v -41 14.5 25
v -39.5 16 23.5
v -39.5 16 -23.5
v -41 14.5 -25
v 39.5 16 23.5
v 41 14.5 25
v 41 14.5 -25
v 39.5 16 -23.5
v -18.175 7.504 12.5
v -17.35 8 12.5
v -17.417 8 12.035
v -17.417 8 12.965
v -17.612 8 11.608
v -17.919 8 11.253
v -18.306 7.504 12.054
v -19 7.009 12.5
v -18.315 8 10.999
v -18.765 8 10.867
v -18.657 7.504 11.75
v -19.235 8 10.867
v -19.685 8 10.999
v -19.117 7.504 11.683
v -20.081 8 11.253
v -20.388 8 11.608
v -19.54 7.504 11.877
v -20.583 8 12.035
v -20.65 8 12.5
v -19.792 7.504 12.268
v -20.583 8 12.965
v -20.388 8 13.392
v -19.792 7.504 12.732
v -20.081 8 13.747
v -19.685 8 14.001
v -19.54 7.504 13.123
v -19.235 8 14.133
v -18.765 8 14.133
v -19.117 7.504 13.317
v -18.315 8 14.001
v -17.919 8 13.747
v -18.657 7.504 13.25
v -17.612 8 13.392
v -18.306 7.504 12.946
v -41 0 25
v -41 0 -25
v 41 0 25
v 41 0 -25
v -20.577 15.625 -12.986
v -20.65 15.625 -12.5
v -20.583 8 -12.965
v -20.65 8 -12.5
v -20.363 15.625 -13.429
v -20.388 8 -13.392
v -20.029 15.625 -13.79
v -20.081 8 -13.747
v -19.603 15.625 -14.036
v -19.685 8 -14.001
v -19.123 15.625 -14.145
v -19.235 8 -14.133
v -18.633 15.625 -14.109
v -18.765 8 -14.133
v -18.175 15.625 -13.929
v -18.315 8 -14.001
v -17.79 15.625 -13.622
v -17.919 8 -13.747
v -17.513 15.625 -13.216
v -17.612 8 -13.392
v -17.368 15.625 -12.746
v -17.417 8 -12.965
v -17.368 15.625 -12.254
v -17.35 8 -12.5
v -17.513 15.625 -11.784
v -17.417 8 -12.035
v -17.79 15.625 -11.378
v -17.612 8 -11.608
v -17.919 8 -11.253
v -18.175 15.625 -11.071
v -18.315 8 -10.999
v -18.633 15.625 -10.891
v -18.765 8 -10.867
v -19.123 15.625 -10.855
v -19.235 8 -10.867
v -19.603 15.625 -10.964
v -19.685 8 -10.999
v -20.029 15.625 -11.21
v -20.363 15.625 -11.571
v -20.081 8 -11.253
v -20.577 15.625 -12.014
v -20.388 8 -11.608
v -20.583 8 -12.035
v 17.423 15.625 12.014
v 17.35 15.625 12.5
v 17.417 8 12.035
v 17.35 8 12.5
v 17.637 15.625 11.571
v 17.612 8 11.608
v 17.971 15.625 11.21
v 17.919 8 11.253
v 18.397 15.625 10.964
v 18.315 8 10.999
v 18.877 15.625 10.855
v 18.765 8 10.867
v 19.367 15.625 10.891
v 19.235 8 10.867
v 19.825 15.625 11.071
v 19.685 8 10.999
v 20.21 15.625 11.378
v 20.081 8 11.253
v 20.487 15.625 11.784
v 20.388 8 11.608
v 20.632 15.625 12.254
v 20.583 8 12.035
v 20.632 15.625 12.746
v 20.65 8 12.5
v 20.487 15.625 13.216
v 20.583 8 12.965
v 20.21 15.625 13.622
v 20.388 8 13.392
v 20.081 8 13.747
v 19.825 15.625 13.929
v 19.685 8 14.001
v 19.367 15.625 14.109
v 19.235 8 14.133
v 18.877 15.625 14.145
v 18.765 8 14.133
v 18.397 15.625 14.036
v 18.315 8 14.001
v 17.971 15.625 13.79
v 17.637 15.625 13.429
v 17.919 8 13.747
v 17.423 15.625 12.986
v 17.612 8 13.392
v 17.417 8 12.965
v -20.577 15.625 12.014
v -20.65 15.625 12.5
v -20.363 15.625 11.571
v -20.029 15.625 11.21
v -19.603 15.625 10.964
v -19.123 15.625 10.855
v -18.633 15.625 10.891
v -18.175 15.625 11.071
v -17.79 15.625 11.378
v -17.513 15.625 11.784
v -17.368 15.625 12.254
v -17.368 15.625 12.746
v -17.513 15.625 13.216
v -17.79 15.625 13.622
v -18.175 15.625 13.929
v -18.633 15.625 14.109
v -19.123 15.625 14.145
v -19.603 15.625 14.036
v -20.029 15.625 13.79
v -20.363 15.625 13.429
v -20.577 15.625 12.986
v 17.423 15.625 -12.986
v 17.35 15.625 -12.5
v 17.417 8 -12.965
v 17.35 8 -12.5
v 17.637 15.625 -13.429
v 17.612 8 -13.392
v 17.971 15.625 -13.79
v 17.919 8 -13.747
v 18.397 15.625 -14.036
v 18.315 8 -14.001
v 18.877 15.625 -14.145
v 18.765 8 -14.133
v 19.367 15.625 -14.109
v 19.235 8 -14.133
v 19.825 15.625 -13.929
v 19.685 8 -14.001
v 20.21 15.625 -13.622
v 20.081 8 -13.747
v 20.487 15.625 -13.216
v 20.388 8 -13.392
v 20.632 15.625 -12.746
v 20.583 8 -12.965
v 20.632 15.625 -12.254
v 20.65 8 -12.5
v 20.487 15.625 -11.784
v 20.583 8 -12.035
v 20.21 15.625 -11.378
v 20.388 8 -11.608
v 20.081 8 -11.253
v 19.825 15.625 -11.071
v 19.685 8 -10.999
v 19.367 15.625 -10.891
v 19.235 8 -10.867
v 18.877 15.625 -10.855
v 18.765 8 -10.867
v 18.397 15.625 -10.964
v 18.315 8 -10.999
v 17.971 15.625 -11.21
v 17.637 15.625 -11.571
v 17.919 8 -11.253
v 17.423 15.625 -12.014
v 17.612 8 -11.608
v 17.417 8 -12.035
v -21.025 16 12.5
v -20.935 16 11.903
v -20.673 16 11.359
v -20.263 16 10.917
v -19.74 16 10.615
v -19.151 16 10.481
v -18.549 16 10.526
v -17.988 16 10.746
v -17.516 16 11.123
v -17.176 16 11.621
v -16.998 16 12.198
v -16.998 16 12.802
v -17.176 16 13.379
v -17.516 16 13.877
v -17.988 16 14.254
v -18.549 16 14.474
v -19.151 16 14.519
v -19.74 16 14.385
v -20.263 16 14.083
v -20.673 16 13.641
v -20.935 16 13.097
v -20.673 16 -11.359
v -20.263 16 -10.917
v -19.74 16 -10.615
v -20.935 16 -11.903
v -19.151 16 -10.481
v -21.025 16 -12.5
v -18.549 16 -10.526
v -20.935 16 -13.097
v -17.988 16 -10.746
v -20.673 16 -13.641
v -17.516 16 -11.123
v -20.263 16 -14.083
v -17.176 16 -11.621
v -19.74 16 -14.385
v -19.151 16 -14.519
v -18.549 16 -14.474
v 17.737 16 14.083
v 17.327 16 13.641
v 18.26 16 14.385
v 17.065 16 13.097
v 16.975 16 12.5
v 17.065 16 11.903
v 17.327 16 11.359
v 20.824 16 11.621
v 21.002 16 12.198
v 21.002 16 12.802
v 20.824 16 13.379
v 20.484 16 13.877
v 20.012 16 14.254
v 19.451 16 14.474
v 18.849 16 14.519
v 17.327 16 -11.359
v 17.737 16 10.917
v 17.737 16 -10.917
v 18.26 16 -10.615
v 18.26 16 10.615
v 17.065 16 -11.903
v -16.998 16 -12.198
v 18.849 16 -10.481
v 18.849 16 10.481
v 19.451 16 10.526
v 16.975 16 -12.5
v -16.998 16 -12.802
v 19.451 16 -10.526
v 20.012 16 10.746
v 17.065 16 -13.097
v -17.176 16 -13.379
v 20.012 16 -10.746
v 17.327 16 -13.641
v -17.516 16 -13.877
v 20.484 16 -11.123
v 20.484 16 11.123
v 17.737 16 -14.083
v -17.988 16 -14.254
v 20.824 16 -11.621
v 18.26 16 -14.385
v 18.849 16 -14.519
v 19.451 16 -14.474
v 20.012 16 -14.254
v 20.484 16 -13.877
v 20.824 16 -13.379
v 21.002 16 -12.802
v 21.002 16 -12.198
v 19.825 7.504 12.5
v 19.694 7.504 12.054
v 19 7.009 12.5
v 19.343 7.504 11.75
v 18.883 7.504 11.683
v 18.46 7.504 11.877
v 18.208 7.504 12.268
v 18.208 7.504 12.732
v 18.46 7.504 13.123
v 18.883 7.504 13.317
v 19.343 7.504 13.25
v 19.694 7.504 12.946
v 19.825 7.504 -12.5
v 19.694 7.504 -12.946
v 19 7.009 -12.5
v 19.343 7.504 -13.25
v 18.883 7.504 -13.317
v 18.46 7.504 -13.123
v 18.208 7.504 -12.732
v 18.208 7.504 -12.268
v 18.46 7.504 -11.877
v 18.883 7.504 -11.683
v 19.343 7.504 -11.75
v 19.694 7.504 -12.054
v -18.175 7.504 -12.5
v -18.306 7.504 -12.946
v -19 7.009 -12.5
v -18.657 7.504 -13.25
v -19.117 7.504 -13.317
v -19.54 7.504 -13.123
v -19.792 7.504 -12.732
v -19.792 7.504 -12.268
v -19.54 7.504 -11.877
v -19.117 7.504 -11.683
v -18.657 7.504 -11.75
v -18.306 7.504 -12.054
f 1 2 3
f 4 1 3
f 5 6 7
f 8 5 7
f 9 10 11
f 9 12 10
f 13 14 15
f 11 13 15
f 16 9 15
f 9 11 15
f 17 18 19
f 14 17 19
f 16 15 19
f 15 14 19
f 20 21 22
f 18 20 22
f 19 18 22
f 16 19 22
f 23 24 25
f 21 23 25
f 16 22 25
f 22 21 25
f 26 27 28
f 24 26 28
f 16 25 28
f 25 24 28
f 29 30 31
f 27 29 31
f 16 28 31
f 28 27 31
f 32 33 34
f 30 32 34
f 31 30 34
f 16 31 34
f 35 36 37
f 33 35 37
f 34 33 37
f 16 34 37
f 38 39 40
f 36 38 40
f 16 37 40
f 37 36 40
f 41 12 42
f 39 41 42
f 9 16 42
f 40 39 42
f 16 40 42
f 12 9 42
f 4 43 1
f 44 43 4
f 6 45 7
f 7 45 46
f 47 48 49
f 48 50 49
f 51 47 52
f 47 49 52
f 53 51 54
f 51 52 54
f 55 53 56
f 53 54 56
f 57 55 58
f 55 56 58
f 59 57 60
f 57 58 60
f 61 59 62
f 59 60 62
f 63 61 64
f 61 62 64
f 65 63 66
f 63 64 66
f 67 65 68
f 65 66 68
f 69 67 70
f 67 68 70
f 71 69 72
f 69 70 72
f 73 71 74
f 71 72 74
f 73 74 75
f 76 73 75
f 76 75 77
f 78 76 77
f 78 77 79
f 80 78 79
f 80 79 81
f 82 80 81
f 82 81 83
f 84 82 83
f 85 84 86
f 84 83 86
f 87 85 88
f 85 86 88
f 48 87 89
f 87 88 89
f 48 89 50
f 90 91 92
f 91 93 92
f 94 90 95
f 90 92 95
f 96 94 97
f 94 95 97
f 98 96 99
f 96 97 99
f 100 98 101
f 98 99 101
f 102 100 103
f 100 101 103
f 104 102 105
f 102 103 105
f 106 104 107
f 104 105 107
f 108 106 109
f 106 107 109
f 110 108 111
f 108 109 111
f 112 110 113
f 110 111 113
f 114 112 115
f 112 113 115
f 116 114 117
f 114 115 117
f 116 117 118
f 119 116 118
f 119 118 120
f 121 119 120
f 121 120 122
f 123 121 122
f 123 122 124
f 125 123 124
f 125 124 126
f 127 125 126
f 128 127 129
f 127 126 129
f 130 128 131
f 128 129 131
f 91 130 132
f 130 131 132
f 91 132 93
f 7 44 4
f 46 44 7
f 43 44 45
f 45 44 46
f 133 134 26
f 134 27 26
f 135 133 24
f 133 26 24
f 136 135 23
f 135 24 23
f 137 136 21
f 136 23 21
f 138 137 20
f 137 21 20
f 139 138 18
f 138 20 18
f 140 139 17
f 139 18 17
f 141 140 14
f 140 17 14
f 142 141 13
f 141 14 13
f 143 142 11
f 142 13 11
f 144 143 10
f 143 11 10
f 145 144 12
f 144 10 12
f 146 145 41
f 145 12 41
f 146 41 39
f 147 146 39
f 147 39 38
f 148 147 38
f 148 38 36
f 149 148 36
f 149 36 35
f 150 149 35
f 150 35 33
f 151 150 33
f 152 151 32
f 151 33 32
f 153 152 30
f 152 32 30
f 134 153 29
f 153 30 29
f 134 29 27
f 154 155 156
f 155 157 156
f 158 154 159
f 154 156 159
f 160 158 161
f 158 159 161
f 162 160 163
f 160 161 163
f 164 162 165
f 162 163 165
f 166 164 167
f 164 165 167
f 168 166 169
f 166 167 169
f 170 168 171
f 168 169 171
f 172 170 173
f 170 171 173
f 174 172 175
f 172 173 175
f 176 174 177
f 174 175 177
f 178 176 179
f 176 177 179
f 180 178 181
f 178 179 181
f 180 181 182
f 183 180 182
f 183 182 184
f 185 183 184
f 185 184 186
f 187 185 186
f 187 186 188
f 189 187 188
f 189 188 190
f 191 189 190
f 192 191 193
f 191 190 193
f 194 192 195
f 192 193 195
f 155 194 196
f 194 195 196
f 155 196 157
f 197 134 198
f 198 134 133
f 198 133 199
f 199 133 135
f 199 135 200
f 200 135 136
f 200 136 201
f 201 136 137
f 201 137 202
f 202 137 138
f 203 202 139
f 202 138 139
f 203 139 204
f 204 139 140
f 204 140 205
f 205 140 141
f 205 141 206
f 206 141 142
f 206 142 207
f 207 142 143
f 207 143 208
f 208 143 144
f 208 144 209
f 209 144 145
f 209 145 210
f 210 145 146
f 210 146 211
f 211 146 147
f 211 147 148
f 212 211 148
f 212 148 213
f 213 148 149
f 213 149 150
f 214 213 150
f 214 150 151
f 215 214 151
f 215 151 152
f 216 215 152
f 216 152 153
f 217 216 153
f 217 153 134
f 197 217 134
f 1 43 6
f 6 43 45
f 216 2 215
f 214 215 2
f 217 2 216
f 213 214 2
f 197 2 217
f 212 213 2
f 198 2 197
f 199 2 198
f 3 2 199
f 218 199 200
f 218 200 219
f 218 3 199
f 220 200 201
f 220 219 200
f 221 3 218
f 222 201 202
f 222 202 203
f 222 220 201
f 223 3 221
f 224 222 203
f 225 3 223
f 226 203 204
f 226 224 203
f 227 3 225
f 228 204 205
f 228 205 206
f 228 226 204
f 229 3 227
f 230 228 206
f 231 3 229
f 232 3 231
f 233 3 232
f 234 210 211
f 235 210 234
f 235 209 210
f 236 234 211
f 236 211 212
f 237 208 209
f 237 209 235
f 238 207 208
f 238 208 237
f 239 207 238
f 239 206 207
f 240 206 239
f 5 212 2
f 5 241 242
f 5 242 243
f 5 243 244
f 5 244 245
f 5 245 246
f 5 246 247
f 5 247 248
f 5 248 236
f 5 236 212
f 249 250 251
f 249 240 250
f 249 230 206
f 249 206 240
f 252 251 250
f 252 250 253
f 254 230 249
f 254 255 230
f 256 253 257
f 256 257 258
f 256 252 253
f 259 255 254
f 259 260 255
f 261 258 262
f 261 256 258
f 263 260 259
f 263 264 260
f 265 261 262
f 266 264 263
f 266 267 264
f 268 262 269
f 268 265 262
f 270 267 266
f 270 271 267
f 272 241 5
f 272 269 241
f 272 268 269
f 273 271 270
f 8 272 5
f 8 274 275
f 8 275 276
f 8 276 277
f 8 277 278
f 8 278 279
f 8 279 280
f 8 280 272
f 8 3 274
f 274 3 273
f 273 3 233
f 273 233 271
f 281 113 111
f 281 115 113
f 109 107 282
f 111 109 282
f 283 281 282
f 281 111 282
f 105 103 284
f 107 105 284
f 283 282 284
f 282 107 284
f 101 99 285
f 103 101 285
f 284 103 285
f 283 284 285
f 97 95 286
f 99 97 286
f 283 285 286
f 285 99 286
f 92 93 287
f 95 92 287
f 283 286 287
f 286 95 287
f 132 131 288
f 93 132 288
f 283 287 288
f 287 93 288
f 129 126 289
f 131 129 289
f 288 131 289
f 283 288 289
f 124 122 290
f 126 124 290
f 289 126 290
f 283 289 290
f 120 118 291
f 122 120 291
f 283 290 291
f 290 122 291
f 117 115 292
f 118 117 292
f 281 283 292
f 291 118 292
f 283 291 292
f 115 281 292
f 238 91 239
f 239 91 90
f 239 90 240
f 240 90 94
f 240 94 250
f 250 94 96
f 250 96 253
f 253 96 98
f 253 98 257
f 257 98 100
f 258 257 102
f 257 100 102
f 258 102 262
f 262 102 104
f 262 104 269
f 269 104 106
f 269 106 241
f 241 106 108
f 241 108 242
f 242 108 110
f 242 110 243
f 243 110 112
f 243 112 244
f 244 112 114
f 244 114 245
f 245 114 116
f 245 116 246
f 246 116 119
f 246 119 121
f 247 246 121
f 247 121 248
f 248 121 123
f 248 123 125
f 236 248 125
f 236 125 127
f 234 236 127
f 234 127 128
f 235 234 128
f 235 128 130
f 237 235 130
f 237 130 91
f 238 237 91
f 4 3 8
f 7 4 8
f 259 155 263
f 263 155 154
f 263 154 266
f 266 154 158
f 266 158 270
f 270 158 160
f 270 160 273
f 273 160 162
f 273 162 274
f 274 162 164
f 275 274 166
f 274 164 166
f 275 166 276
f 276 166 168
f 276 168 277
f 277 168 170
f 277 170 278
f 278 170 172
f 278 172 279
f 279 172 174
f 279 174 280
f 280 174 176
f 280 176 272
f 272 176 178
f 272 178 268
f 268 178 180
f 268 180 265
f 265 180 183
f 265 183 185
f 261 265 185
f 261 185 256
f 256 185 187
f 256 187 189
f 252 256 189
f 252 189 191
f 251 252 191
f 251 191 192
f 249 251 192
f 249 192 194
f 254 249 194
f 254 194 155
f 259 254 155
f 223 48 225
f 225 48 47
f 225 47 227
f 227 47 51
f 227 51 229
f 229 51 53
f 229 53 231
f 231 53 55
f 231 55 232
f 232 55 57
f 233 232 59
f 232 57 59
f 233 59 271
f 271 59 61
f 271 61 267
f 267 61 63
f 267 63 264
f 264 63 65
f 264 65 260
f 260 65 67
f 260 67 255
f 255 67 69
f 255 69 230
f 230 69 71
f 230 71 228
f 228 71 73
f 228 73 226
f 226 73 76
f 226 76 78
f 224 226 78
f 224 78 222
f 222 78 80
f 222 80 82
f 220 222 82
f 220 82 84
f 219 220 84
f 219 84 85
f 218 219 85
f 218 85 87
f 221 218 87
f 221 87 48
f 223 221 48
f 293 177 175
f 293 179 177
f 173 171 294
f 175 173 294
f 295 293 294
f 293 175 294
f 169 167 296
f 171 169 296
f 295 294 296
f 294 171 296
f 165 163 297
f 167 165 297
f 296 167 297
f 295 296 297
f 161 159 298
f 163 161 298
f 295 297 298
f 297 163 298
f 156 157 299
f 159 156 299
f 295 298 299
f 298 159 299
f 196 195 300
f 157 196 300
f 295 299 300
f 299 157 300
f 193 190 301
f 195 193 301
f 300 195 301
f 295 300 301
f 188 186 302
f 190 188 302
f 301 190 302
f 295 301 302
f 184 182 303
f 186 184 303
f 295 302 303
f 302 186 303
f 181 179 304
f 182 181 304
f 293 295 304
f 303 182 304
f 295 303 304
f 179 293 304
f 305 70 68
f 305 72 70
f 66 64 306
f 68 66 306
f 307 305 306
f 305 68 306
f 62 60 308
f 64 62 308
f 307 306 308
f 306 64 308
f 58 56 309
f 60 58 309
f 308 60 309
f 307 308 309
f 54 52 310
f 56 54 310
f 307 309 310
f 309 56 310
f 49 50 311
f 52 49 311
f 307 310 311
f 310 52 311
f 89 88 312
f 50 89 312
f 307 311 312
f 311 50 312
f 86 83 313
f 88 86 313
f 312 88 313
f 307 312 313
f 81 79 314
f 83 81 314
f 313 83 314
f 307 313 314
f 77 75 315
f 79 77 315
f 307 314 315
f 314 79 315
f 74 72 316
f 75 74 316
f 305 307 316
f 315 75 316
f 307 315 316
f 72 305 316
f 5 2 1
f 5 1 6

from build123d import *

# Parameters (mm, degrees)
SKETCH1_W                   = 82
SKETCH1_H                   = 50
BOSS_EXTRUDE1_DEPTH         = 16
M4_TAPPED_HOLE1_D           = 3.3
M4_TAPPED_HOLE1_DEPTH       = 8
M4_TAPPED_HOLE1_CSINK_D     = 4.05
M4_TAPPED_HOLE1_CSINK_ANGLE = 90
M4_TAPPED_HOLE1_TIP         = 0.991420021
CHAMFER1_SIZE               = 1.5


with BuildPart() as part:
    # Sketch1 → Boss-Extrude1 (new body)
    with BuildSketch(Plane(origin=(0, 0, 0), x_dir=(1, 0, 0), z_dir=(0, 1, 0))):
        Rectangle(SKETCH1_W, SKETCH1_H)
    extrude(amount=BOSS_EXTRUDE1_DEPTH)

    # M4 Tapped Hole1
    with Locations(Plane(origin=(0, 16, 0), x_dir=(1, 0, 0), z_dir=(0, 1, 0))):
        with Locations((-19, 12.5), (-19, -12.5), (19, -12.5), (19, 12.5)):
            CounterSinkHole(M4_TAPPED_HOLE1_D / 2, M4_TAPPED_HOLE1_CSINK_D / 2, depth=M4_TAPPED_HOLE1_DEPTH, counter_sink_angle=M4_TAPPED_HOLE1_CSINK_ANGLE)
            with Locations((0, 0, -(M4_TAPPED_HOLE1_DEPTH + M4_TAPPED_HOLE1_TIP / 2))):  # 118° drill point
                Cone(0, M4_TAPPED_HOLE1_D / 2, M4_TAPPED_HOLE1_TIP, mode=Mode.SUBTRACT)

    # Chamfer1
    chamfer1_edges = [part.edges().sort_by_distance(p)[0] for p in [
        (-41, 16, 0),
        (0, 16, 25),
        (41, 16, 0),
        (0, 16, -25),
    ]]
    chamfer(chamfer1_edges, length=CHAMFER1_SIZE)


solid = part.part
